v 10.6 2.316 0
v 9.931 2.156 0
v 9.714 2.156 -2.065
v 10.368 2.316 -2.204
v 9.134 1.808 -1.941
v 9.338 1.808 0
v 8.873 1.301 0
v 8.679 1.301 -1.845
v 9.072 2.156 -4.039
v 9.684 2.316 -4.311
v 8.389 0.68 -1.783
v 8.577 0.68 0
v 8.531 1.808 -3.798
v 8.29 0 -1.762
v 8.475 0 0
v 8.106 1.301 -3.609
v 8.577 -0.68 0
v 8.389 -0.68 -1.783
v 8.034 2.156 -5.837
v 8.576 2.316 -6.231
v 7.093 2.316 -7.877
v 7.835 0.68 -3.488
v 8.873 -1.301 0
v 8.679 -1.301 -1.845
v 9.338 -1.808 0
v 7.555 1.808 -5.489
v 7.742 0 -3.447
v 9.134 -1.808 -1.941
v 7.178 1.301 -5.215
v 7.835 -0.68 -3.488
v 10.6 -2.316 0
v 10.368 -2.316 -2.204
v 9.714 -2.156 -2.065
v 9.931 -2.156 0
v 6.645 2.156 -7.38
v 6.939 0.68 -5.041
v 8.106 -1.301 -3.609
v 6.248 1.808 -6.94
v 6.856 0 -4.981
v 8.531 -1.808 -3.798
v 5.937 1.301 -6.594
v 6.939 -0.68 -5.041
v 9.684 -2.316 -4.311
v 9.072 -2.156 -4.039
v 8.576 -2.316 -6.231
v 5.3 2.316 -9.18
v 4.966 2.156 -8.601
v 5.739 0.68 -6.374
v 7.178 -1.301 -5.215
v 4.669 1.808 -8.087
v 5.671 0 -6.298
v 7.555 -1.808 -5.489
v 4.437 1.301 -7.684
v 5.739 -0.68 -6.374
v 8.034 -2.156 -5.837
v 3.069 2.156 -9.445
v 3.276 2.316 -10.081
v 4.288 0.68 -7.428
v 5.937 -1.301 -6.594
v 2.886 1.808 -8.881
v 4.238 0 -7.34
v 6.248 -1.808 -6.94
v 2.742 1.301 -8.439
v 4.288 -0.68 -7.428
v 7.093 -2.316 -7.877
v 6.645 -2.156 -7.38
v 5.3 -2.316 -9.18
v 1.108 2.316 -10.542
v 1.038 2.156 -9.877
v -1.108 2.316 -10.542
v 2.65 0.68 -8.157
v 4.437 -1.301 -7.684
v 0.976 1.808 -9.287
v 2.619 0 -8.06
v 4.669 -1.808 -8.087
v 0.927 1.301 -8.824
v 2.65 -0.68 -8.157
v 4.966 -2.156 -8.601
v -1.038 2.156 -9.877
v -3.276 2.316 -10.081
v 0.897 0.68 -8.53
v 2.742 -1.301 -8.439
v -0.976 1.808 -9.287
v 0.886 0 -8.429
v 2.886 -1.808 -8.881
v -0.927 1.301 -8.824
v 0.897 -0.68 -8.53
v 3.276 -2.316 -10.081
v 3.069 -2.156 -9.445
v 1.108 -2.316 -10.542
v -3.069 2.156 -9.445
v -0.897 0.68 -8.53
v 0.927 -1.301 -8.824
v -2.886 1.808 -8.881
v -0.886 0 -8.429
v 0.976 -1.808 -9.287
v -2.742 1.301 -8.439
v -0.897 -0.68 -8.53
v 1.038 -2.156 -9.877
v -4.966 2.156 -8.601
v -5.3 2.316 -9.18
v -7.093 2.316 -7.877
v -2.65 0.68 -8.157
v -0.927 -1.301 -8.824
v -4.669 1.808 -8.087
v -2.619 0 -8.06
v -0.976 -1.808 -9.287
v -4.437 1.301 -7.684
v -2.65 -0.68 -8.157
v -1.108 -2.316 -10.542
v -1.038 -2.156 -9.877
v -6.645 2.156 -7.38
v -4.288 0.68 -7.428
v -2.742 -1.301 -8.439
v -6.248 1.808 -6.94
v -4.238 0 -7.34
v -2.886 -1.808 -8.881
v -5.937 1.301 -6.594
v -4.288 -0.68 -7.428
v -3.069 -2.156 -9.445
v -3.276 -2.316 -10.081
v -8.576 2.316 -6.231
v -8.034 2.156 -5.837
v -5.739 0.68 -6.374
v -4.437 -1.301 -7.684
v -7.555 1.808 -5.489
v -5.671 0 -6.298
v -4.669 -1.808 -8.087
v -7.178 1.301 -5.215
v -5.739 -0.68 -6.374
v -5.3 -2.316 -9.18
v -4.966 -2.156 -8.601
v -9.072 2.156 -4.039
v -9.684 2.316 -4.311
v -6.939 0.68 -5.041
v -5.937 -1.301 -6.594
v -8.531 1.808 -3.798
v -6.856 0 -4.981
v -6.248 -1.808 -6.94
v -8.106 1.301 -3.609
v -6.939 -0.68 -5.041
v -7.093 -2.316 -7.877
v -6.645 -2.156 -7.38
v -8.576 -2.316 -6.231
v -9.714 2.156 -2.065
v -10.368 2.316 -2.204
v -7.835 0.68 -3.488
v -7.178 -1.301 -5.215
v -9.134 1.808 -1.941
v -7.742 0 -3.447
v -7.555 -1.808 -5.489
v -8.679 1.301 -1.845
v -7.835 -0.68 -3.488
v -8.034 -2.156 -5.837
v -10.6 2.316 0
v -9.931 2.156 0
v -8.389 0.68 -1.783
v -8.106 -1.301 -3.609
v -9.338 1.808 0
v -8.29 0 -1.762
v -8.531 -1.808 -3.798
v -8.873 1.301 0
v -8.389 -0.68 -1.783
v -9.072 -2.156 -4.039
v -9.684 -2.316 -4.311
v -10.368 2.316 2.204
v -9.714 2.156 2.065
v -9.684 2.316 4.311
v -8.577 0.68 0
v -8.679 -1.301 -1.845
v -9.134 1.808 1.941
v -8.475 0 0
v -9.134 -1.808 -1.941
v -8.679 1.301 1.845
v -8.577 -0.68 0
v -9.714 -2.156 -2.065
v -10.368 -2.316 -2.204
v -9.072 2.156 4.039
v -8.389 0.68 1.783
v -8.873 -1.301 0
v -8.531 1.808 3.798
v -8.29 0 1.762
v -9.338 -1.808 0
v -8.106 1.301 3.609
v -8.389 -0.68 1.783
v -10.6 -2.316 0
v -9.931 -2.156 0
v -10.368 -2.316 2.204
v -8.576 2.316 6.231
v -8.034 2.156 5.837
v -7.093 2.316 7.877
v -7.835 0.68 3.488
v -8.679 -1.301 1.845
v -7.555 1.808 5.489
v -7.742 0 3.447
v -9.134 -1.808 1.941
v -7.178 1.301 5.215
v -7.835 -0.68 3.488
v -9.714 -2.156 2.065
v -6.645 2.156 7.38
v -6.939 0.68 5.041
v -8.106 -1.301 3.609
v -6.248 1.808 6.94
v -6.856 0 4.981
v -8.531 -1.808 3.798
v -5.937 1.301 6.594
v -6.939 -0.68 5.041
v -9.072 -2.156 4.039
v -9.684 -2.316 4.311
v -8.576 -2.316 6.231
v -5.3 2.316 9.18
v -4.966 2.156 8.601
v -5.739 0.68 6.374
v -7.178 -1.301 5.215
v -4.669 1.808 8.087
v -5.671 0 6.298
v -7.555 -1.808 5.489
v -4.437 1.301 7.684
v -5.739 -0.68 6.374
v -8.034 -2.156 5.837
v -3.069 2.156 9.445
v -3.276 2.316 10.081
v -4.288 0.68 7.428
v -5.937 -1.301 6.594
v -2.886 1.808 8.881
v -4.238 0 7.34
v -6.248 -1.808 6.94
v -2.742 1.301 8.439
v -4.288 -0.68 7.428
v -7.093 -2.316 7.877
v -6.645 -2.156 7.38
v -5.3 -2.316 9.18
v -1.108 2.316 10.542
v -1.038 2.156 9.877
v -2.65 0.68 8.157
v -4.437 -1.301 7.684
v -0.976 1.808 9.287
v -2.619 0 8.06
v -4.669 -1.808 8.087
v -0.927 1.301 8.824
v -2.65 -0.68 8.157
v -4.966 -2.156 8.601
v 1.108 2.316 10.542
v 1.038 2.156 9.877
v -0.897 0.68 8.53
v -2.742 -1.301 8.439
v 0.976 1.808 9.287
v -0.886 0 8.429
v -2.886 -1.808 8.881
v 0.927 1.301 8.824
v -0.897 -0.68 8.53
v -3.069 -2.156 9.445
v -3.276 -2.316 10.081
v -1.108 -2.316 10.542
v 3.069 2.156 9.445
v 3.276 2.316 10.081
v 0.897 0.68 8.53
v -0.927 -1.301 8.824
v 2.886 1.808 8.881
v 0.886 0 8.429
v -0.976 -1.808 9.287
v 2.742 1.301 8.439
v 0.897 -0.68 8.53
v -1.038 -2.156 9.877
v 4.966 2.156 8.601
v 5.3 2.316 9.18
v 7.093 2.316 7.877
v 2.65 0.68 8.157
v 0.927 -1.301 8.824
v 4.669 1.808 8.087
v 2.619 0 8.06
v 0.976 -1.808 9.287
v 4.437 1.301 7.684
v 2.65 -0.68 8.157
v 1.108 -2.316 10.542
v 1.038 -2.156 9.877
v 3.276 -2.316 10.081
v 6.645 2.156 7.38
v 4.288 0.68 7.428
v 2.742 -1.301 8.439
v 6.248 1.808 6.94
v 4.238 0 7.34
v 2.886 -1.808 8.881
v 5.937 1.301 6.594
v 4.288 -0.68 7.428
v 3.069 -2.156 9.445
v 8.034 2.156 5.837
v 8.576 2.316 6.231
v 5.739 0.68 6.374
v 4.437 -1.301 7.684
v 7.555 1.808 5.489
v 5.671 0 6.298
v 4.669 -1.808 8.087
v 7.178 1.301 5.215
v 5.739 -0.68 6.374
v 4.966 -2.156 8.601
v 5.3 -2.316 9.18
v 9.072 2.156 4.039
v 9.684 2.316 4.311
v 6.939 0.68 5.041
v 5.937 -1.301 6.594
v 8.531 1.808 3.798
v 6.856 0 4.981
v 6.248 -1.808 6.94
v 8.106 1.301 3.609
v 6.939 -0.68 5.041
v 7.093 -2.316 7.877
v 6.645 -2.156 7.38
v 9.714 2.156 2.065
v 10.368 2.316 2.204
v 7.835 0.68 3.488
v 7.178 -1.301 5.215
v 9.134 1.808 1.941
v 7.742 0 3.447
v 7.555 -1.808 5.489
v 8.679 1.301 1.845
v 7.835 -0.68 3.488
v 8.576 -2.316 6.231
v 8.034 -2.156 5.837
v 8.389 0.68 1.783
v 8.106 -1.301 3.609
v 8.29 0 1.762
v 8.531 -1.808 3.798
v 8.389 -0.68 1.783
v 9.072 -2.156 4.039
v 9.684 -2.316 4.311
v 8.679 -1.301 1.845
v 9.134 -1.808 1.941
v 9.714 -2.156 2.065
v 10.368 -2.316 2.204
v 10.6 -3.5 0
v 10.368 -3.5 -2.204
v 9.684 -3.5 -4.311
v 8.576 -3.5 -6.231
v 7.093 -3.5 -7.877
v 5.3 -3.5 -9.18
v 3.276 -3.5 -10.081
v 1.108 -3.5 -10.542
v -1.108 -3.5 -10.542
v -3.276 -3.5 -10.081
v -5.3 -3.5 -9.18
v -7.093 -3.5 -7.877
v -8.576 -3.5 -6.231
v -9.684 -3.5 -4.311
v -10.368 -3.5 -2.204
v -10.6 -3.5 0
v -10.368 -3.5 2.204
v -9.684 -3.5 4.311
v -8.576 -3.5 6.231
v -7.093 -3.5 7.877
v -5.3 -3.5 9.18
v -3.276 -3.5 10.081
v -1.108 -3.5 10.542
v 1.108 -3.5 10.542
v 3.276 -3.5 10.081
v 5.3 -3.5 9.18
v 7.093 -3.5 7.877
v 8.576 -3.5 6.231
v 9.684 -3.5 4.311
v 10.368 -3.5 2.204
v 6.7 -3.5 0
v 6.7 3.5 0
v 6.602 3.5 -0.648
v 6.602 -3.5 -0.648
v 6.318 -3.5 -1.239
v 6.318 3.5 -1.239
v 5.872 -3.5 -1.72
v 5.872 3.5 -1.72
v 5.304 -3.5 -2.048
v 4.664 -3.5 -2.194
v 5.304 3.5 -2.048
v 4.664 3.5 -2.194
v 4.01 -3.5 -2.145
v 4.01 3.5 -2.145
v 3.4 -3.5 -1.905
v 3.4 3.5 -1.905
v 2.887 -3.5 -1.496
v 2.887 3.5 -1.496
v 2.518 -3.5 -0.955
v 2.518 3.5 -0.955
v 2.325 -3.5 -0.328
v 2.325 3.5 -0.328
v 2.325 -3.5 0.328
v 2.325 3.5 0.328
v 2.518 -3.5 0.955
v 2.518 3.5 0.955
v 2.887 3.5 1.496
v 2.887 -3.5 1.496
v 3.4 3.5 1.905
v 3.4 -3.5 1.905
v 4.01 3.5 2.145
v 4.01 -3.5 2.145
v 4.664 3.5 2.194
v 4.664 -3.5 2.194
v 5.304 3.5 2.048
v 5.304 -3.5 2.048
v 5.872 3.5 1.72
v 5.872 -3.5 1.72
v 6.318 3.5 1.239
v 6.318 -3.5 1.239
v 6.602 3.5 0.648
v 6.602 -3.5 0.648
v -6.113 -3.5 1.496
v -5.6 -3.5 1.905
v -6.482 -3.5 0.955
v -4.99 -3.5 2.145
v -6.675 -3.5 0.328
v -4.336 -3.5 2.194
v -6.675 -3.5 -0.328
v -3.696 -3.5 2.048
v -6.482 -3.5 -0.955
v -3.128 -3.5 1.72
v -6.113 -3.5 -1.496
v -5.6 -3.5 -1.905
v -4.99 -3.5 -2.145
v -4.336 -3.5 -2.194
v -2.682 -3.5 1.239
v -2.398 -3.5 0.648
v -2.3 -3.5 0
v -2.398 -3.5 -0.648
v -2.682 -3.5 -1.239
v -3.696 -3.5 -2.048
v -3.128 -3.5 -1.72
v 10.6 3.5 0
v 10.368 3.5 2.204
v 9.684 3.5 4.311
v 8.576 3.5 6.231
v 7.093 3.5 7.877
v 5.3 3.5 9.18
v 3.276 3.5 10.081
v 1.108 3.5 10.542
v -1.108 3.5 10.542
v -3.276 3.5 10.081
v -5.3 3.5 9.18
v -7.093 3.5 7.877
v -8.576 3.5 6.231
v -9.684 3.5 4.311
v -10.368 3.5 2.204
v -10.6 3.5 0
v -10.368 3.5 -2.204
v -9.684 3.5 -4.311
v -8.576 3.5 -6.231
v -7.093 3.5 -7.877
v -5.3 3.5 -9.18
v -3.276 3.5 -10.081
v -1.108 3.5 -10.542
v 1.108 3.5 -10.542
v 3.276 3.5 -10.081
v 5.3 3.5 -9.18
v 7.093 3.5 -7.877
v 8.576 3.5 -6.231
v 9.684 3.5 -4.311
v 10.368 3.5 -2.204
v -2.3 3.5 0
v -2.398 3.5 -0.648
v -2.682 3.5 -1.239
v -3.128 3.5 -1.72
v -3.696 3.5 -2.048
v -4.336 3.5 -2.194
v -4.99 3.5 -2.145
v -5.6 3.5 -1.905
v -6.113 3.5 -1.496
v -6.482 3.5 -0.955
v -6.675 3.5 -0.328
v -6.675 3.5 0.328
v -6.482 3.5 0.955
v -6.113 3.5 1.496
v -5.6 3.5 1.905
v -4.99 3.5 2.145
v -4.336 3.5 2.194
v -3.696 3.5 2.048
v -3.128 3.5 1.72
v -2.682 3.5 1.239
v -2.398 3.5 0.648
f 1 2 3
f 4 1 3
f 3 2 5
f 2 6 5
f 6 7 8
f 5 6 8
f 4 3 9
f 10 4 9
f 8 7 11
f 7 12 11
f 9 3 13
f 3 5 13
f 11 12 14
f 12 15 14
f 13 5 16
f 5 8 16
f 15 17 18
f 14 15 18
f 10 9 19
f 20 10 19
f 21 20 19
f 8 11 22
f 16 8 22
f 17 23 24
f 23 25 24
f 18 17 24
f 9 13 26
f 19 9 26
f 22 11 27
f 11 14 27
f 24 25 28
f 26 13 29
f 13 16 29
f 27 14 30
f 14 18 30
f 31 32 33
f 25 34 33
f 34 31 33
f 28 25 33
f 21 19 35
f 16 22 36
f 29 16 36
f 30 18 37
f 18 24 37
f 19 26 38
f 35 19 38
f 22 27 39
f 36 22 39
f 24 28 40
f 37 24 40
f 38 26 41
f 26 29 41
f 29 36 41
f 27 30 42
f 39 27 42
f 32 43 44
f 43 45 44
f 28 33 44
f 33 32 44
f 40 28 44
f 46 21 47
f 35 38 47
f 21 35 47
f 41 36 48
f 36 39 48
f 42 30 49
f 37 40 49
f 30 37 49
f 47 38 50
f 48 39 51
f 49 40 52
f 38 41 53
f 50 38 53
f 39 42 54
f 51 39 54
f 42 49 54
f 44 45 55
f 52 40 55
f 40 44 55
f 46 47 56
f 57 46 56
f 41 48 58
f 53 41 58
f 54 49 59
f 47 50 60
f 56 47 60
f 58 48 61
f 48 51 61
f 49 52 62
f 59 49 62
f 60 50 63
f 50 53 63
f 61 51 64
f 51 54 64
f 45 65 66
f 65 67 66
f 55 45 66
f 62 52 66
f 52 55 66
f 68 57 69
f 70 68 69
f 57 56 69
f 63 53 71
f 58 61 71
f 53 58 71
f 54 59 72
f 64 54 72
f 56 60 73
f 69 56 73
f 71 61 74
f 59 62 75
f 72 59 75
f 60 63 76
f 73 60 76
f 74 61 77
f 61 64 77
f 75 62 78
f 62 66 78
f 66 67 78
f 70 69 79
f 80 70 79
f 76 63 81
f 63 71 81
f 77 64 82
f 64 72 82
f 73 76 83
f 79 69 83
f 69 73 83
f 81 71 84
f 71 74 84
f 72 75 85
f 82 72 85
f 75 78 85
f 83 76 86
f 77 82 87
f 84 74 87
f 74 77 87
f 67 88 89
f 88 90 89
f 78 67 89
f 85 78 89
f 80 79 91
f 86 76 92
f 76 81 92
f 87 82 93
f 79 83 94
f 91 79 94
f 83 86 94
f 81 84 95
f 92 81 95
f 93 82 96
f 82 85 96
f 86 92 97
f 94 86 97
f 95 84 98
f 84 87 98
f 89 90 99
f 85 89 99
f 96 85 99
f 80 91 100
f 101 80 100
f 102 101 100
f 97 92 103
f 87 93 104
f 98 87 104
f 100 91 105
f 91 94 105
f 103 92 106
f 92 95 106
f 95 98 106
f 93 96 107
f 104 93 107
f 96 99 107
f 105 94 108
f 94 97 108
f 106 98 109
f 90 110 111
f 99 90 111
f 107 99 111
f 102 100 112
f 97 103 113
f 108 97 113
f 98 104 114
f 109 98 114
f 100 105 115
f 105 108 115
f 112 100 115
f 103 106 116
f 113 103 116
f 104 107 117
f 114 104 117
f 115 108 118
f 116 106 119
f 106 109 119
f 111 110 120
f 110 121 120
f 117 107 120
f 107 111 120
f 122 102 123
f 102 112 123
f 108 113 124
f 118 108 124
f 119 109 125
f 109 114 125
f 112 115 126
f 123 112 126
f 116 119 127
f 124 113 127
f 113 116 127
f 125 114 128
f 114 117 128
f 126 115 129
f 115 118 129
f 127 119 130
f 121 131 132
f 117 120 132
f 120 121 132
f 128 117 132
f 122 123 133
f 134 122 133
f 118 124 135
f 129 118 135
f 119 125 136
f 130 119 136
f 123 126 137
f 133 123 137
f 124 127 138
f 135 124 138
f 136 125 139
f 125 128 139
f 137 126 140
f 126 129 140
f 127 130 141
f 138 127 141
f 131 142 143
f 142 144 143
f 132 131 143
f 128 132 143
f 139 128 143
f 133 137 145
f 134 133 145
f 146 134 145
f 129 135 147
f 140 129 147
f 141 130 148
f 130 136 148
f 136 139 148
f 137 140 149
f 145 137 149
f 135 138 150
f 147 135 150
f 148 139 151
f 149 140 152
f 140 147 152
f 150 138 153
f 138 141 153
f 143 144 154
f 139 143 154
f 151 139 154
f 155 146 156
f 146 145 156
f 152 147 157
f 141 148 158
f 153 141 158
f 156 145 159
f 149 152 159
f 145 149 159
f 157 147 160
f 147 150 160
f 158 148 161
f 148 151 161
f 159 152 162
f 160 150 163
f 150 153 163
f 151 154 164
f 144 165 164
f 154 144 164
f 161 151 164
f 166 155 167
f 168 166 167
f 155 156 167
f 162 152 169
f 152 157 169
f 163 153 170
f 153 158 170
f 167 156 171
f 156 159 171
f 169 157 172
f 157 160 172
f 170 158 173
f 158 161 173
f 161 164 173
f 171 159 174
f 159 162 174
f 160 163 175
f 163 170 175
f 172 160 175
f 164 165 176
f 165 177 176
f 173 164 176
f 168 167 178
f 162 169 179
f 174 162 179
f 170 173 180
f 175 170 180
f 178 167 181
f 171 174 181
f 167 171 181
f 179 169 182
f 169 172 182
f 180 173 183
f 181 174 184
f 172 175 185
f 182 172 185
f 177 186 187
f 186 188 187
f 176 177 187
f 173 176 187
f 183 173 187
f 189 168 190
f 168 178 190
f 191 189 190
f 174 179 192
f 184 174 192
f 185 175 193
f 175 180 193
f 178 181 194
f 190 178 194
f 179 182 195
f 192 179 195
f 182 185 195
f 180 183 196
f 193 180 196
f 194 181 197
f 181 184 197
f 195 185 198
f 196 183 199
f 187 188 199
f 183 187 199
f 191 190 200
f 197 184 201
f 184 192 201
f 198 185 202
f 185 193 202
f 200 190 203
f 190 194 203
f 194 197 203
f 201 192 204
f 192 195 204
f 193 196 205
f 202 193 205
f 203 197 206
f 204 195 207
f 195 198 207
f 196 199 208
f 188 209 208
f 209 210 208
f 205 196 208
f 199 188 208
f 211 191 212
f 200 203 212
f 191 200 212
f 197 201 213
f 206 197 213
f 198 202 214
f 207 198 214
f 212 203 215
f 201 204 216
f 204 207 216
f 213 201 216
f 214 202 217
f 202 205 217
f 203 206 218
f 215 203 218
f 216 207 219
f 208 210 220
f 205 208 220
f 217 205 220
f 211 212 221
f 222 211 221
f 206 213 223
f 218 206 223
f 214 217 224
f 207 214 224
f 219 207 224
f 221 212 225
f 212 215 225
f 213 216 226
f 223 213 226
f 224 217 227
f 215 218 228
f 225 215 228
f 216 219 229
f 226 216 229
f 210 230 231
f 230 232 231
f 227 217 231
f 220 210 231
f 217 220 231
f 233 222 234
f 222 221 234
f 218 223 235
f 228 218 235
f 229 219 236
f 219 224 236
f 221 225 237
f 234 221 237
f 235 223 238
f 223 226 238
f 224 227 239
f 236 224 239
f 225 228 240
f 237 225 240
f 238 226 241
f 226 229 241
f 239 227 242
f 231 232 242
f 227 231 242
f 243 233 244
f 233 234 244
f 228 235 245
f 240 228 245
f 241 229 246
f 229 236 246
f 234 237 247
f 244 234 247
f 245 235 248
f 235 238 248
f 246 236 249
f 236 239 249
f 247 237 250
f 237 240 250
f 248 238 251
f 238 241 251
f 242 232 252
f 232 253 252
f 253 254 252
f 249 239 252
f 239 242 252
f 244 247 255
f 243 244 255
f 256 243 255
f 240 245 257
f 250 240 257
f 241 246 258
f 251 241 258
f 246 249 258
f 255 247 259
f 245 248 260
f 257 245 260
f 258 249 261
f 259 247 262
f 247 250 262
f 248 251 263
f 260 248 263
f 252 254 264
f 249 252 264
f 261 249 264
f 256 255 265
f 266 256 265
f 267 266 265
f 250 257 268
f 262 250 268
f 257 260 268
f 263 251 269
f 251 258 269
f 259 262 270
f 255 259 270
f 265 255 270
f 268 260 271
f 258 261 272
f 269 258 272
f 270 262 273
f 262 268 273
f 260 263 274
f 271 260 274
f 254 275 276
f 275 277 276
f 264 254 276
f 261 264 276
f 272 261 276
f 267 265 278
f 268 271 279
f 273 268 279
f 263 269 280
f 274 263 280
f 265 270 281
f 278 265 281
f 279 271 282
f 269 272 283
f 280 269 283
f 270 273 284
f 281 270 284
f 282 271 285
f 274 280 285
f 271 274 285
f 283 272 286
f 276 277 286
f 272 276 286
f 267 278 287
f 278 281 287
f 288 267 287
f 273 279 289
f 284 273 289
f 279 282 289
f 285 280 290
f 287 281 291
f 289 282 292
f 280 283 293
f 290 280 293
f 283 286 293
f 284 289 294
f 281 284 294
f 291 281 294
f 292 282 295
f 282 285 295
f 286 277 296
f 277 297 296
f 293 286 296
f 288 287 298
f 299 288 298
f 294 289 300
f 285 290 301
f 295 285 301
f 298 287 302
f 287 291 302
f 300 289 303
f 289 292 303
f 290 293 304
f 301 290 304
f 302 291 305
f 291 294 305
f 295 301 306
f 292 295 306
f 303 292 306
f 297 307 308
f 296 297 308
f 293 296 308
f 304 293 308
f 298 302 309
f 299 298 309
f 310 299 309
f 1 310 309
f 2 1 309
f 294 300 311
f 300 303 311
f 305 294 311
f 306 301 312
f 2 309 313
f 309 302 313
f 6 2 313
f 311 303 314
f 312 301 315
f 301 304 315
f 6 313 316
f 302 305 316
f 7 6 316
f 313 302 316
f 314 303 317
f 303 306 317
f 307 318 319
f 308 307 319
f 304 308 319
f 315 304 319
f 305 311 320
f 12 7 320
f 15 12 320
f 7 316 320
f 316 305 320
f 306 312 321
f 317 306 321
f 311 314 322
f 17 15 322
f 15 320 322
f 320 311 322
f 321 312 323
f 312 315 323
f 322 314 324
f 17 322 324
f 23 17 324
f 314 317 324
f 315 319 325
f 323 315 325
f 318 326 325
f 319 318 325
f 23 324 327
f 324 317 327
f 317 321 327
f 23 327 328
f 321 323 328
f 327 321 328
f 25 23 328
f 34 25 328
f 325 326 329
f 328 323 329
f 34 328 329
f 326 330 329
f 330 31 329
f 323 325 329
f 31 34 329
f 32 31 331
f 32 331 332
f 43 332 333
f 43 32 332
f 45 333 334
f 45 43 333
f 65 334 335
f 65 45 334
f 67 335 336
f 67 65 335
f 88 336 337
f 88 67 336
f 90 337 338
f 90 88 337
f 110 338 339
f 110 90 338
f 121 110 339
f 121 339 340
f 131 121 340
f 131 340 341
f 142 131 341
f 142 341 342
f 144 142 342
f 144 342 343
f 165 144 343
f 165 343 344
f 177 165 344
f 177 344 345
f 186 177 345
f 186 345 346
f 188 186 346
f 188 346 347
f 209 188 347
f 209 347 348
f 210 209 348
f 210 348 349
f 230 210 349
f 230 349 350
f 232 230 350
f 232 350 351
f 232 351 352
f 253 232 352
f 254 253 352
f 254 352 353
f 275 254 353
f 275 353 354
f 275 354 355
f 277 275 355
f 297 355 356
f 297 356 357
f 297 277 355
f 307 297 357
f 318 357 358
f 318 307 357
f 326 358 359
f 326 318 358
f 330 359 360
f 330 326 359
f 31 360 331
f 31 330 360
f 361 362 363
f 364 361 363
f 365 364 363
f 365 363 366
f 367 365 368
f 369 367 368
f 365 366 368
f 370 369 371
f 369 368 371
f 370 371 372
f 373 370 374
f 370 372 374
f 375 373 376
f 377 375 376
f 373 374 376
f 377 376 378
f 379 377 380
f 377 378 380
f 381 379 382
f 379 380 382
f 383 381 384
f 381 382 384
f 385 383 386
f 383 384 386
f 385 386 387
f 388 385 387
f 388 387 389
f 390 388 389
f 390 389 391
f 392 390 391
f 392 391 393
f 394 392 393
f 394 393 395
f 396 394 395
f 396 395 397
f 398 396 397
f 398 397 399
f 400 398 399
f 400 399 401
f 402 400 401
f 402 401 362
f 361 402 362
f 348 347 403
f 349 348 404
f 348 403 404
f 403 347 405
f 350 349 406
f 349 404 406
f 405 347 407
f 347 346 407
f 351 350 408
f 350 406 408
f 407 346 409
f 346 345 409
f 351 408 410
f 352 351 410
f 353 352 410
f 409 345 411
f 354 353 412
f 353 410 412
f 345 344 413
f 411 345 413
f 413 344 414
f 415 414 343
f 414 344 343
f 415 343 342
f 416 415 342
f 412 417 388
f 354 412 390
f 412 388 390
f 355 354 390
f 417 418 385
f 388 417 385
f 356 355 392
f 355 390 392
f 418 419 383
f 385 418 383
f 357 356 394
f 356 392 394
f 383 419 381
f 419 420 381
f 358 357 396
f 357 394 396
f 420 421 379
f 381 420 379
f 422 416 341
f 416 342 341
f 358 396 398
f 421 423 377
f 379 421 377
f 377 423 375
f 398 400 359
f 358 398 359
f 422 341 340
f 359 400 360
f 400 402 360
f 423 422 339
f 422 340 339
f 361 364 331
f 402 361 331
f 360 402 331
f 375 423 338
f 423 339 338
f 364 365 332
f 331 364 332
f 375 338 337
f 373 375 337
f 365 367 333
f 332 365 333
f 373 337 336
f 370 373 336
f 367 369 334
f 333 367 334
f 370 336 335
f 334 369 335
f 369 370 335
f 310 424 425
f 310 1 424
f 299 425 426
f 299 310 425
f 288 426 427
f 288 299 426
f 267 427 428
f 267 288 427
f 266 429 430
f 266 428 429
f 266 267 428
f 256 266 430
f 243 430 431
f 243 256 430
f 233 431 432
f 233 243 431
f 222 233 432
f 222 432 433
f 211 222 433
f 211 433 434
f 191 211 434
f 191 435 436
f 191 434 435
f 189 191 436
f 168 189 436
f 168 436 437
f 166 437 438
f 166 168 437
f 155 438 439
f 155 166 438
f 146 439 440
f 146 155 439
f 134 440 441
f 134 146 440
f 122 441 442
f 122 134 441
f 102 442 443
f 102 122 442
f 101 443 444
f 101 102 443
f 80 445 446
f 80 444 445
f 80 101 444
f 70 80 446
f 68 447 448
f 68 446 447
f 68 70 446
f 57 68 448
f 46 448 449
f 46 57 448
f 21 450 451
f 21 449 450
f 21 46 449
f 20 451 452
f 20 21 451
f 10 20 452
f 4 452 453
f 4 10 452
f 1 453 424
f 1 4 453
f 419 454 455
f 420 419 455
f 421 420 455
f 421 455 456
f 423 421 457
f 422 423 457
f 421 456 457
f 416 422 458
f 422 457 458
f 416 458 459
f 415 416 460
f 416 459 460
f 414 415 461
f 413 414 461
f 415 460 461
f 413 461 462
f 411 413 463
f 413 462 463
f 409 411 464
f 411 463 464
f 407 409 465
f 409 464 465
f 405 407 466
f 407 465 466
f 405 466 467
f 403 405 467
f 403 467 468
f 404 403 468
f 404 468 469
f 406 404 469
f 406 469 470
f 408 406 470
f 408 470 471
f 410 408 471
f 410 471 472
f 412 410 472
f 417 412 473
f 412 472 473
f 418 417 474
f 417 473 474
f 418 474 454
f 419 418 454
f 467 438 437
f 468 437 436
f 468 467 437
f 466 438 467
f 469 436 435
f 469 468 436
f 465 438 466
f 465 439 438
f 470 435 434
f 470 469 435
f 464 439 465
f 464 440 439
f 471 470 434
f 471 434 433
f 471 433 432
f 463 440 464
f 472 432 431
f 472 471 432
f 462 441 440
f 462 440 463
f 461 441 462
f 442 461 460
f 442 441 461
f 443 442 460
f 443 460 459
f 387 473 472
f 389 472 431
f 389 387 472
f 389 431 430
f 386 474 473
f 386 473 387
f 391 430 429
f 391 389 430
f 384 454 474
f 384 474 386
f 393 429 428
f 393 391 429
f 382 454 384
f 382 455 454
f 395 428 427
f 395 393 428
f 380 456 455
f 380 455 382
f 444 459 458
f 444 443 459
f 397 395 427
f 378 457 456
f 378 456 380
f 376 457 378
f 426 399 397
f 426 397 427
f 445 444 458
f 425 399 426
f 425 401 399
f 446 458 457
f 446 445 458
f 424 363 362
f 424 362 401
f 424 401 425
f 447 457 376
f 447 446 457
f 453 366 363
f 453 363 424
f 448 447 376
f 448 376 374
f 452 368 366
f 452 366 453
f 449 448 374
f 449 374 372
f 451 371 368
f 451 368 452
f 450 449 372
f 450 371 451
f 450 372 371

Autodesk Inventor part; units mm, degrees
ref_plane "YZ Plane" through (0, 0, 0) normal (1, 0, 0) x (0, 1, 0)
ref_plane "XZ Plane" through (0, 0, 0) normal (0, 1, 0) x (-1, 0, 0)
ref_plane "XY Plane" through (0, 0, 0) normal (0, 0, 1) x (1, 0, 0)
ref_plane "Work Plane1" through (0, 0, 0) normal (0, 0, 1) x (1, 0, 0)
sketch "Sketch1" plane through (0, 0, 0) normal (0, 0, 1) x (1, 0, 0)
  arc A0 (13.0719, -0.4942) -> (13.1202, -0.1498) centre (10.8, 0) ccw
  circle A1 centre (10.8, 0) radius 2.325
  line L0 (10.6, -3.5) -> (10.6, -2.3164)
  line L1 (10.6, -3.5) -> (0, -3.5)
  line L2 (0, -130.1465) -> (0, 181.4158)
  line L3 (10.8, 0) -> (0, 0) construction
  line L4 (10.6, 3.5) -> (10.6, 2.3164)
  line L5 (10.6, 3.5) -> (0, 3.5)
  point P0 (0, 3.5)
  dimension "d1" = 3.5
  dimension "d12" = 4.65
  dimension "d13" = 0.2
  dimension "d14" = 10.8
revolve "Revolution1" add sketch "Sketch1" angle 360 about axis through (0, -130.1465, 0) along (0, 1, 0) contours L0 L1 L2 L5 L4 A1
sketch "Sketch2" plane through (0, 3.5, 0) normal (0, 1, 0) x (1, 0, 0)
  circle A0 centre (4.5, 0) radius 2.2
  circle A1 centre (0, 0) radius 10.6 projected
  circle A2 centre (0, 0) radius 10.6 projected
  circle A3 centre (0, 0) radius 10.6 projected
  circle A4 centre (0, 0) radius 8.35
  circle A5 centre (0, 4.5) radius 2.2
  circle A6 centre (-4.5, 0) radius 2.2
  circle A7 centre (0, -4.5) radius 2.2
  point P0 (0, 0)
  dimension "d3" = 4.4
  dimension "d4" = 2.25
  dimension "d5" = 4.5
  dimension "d8" = 360
extrude "Extrusion1" cut sketch "Sketch2" against normal through all contours A0 | A6
properties part number "Venstre_rotator"
